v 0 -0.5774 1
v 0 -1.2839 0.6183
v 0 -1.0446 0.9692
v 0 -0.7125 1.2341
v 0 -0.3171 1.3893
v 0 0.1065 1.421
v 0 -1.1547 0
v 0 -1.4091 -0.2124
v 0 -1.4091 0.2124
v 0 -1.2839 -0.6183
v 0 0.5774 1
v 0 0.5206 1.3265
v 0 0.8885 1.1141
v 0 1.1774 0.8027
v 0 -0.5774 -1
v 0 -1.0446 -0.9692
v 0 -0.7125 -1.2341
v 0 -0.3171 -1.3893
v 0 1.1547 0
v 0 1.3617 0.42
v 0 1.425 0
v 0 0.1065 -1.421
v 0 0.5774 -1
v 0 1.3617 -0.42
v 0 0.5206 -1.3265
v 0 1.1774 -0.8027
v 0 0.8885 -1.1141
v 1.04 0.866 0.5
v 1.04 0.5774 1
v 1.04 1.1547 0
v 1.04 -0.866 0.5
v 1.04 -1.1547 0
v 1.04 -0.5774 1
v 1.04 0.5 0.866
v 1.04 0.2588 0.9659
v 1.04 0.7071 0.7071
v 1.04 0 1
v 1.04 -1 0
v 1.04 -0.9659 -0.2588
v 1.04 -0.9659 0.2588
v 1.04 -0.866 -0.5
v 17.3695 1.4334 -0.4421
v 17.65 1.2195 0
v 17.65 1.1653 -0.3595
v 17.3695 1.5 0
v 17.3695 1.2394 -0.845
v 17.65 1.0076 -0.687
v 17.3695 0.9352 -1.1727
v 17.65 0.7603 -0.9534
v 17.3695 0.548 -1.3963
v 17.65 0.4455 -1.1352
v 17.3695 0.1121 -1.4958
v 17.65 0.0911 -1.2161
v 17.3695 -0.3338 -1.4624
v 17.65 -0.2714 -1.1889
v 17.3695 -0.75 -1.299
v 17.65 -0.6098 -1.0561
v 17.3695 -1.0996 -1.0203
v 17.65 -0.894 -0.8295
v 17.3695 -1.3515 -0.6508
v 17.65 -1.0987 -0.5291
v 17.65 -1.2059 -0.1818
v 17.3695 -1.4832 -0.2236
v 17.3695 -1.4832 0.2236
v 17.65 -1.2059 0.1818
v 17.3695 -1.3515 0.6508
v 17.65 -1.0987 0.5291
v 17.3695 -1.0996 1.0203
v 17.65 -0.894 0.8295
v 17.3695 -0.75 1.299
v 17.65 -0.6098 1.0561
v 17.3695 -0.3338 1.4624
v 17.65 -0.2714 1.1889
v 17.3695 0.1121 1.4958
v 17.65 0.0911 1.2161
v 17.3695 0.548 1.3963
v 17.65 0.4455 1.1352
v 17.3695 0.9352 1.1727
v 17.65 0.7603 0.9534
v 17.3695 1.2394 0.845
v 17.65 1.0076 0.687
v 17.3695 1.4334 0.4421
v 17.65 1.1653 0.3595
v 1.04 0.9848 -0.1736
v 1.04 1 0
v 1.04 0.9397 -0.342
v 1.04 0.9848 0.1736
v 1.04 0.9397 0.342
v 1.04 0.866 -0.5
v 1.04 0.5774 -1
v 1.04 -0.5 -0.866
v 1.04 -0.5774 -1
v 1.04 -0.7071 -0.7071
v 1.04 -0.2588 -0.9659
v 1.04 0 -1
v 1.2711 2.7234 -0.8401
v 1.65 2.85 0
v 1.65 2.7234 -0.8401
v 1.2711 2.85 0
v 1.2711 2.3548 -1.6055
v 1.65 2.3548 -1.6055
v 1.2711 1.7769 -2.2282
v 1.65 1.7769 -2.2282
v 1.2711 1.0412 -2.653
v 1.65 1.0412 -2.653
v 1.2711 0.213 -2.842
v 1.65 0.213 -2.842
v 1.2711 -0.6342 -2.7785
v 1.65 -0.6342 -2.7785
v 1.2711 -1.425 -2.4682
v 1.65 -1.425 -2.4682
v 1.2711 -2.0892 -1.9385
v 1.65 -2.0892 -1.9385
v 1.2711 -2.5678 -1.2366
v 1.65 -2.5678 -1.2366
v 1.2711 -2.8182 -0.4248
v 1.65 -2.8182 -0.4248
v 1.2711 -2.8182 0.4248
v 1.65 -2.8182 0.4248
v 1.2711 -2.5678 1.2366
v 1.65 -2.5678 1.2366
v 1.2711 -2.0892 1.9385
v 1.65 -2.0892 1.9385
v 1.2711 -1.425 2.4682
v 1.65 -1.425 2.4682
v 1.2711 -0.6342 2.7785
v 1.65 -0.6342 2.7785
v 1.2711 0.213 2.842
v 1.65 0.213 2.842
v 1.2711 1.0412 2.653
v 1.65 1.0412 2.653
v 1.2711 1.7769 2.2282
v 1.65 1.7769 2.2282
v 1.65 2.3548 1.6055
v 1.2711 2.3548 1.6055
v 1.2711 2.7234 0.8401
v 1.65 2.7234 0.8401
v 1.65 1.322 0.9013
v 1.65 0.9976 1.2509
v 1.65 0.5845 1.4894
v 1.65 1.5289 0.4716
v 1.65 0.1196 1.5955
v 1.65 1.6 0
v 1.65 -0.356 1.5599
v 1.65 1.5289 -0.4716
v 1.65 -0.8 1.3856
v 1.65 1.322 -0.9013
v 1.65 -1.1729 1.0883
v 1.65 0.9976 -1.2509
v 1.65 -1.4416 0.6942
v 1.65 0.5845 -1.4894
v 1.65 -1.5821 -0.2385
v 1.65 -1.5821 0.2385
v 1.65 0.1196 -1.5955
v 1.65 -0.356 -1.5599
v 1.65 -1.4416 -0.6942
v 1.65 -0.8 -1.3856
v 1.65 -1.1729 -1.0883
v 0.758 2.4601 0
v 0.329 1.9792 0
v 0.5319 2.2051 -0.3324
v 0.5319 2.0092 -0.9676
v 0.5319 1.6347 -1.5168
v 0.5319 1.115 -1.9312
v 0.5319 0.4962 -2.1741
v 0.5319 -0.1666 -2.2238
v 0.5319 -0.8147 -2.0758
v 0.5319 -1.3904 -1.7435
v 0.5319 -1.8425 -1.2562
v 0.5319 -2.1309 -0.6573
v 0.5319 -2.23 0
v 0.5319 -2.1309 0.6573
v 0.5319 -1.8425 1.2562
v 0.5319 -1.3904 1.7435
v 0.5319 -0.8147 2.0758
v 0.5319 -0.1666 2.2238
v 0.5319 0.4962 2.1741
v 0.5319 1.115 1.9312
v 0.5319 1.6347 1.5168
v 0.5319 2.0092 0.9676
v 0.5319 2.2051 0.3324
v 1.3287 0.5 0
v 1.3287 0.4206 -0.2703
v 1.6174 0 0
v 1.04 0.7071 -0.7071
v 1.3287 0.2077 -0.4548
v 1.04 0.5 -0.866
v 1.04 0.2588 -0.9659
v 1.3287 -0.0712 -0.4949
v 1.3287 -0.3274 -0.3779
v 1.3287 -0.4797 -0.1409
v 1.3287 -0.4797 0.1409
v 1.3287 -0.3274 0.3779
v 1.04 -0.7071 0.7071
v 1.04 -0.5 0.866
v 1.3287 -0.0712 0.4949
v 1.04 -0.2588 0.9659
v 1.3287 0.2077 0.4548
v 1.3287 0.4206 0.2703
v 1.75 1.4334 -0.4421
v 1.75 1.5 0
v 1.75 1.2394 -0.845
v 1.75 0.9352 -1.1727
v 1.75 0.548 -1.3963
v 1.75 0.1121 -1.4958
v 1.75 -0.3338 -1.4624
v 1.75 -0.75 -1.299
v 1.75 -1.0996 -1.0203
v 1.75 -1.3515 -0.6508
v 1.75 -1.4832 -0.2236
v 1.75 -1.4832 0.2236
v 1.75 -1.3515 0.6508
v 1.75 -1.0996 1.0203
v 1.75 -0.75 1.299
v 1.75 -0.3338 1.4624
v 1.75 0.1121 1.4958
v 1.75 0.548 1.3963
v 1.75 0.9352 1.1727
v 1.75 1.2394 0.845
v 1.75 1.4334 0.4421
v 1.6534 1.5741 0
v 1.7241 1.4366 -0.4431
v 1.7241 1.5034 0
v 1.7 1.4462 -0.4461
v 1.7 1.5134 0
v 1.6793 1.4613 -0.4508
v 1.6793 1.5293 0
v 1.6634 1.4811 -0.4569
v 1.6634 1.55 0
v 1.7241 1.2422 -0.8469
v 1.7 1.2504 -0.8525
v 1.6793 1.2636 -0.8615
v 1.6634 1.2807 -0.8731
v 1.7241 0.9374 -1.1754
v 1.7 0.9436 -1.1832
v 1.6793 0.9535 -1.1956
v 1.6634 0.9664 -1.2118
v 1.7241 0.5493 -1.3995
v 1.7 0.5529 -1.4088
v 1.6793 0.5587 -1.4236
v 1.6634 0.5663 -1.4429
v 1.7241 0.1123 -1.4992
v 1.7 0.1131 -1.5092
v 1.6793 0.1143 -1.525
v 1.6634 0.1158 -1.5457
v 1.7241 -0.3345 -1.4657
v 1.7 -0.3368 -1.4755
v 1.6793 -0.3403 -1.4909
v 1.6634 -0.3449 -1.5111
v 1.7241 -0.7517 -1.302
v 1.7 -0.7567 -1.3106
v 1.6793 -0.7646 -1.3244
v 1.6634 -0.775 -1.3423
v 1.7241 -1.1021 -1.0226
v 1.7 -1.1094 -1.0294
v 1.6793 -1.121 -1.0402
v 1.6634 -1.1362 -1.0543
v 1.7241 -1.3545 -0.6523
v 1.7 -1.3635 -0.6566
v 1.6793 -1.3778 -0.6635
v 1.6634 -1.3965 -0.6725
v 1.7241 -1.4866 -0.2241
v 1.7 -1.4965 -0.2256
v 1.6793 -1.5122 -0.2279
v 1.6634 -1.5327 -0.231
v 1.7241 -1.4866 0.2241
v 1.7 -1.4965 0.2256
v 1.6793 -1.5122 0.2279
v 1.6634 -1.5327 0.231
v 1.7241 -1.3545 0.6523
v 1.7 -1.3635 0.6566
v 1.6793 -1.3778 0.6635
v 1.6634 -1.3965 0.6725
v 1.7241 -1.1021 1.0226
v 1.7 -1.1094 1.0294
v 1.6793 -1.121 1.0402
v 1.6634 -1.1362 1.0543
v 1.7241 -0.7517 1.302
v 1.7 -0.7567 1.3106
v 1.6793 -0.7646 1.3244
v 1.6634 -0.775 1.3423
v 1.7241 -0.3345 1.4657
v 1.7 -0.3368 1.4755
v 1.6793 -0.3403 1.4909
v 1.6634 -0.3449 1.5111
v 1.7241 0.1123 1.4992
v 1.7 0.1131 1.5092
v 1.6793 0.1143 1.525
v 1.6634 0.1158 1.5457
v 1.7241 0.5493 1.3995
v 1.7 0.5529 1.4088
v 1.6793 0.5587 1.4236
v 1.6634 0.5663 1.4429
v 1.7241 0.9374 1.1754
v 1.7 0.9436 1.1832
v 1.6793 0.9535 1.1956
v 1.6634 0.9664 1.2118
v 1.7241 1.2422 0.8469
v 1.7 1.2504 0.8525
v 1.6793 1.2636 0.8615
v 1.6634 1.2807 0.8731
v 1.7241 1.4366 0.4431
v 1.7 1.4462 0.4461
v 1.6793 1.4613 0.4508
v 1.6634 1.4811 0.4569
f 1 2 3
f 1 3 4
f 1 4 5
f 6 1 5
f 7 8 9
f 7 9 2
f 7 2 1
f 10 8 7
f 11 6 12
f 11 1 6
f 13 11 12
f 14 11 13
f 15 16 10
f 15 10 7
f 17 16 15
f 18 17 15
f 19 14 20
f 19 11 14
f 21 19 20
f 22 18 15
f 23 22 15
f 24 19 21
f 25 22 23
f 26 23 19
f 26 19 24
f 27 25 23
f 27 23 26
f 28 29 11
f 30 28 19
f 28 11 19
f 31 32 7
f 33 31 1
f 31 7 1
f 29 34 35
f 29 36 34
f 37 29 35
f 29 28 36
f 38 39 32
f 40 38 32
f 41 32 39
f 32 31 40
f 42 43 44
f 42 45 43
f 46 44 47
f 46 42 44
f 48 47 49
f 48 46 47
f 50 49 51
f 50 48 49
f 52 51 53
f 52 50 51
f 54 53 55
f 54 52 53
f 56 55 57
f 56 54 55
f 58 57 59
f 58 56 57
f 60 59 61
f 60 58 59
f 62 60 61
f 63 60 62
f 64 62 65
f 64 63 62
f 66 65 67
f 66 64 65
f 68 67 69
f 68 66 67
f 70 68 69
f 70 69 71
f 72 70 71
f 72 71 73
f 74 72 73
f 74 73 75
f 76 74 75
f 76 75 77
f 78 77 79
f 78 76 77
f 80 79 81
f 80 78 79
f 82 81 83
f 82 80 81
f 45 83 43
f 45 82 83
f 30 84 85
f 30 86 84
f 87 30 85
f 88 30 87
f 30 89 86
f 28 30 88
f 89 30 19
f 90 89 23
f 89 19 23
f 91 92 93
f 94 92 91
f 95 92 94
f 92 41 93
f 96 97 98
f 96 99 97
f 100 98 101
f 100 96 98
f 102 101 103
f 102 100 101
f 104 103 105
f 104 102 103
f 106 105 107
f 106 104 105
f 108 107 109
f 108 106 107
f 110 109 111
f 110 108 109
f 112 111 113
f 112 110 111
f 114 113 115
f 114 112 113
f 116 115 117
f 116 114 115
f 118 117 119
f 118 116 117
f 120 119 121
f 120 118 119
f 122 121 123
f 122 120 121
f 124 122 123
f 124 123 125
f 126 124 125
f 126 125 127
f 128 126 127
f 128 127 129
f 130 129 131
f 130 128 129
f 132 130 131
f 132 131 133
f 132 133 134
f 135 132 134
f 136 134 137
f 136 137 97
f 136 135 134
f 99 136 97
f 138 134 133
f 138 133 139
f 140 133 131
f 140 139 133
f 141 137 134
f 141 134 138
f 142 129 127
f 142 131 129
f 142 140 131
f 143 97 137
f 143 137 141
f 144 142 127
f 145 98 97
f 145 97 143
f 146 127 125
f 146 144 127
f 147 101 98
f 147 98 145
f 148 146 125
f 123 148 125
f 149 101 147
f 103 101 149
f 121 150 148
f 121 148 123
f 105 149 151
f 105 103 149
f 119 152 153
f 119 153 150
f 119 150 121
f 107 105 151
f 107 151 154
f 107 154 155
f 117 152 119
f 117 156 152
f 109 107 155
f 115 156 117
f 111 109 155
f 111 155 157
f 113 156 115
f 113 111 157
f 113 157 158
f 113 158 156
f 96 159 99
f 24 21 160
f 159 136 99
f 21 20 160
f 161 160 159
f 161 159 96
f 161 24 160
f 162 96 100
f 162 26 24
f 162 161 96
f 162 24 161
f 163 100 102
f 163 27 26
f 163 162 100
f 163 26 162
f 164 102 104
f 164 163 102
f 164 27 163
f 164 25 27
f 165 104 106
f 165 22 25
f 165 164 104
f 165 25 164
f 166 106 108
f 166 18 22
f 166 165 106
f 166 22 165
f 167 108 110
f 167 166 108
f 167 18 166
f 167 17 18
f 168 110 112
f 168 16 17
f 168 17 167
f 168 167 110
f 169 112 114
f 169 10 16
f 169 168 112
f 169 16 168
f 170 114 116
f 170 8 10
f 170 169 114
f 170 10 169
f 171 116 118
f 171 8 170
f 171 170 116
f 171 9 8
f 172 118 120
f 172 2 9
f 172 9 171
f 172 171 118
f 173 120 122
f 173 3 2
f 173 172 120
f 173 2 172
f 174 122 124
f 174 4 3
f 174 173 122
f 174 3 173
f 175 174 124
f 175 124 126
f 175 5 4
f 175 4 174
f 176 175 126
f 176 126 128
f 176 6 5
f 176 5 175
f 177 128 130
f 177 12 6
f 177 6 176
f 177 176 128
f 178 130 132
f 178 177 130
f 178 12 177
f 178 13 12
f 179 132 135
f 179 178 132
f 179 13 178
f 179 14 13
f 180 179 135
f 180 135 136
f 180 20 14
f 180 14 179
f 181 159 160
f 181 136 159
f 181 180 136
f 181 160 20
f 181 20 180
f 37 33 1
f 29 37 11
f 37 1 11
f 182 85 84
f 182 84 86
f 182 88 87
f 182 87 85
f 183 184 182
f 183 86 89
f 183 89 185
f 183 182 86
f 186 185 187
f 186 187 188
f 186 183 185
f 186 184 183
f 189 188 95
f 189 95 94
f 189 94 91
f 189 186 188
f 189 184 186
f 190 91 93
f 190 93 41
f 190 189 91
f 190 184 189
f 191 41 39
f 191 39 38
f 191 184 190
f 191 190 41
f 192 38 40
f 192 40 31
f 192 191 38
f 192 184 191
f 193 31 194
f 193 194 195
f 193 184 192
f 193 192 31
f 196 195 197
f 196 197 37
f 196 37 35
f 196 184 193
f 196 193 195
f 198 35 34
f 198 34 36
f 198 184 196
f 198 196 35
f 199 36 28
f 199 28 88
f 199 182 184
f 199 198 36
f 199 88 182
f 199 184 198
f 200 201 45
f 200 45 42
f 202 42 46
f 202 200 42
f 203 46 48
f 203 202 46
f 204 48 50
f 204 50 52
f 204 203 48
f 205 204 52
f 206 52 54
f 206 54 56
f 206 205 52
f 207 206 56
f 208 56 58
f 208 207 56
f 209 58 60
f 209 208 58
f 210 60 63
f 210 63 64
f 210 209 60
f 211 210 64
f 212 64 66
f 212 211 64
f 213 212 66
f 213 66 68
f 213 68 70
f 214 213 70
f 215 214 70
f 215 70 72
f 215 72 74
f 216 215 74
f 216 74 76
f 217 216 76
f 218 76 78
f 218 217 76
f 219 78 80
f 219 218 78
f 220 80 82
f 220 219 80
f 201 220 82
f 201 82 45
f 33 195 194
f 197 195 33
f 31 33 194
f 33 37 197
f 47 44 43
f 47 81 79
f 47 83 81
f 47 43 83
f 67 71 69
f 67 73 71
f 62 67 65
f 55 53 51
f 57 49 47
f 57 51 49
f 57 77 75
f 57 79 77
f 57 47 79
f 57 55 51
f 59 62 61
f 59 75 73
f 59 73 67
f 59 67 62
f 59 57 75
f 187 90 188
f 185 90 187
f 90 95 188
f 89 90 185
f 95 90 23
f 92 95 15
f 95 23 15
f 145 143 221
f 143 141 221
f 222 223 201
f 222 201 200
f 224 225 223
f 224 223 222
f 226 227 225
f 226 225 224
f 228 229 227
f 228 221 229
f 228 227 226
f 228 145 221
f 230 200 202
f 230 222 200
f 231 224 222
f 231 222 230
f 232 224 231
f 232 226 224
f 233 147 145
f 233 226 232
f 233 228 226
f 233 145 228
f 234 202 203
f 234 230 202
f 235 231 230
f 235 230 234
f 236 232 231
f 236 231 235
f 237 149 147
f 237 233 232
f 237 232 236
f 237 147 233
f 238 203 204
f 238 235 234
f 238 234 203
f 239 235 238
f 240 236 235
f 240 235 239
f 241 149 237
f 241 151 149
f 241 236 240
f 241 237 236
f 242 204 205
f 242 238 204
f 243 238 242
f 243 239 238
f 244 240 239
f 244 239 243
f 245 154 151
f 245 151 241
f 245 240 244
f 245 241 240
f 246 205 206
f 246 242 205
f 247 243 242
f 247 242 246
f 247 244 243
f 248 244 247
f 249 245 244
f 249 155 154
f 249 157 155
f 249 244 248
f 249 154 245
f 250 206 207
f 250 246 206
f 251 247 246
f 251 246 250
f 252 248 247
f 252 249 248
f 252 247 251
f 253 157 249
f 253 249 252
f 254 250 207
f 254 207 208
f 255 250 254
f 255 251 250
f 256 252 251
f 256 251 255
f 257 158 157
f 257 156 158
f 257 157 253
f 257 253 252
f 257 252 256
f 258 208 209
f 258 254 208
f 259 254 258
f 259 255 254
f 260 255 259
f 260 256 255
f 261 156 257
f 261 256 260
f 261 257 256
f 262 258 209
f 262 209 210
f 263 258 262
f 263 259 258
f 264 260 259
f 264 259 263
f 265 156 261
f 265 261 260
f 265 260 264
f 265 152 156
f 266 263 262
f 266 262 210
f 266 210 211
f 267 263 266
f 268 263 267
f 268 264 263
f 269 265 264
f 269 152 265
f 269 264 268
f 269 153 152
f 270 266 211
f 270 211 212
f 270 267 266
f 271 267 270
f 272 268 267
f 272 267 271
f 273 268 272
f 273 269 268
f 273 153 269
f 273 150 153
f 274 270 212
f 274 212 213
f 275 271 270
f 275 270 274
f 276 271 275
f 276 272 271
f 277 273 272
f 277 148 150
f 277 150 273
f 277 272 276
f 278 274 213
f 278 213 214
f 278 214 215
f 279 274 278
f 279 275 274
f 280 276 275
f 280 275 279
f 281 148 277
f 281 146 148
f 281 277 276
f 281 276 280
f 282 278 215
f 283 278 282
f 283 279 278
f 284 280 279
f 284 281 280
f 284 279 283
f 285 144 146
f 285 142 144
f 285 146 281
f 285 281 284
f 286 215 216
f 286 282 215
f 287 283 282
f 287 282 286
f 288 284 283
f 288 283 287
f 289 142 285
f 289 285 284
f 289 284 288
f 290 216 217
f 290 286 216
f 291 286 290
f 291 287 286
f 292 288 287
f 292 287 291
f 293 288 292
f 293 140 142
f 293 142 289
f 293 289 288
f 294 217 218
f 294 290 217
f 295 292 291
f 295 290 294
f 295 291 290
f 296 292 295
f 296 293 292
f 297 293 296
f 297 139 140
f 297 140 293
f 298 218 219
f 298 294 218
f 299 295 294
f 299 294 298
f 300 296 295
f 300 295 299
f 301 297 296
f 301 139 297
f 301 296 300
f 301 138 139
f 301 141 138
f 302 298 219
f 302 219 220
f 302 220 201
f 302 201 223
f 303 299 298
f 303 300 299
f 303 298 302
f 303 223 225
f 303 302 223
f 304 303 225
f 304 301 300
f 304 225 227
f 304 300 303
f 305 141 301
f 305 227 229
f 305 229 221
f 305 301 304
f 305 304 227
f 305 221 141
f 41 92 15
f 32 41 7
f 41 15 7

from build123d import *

# Parameters (mm, degrees)
FILLET_1_R  = 0.1
HEX_2_DEPTH = 1.04


with BuildPart() as part:
    # Эскиз1 → Body (revolve)
    with BuildSketch(Plane.XY):
        with BuildLine():
            Line((0, 1.425), (0, 0))
            Line((0, 0), (17.65, 0))
            Line((17.65, 0), (17.65, 1.2195))
            Line((17.65, 1.2195), (17.3695, 1.5))
            Line((17.3695, 1.5), (1.65, 1.5))
            Line((1.65, 1.5), (1.65, 2.85))
            Line((1.65, 2.85), (1.271128829, 2.85))
            ThreePointArc((1.271128829, 2.85), (0.531880191, 2.229988425), (0, 1.425))
        make_face()
    revolve(axis=Axis((-3.643489966, 0, 0), (-1, 0, 0)))

    # Скругление1
    fillet_1_edges = [part.edges().sort_by_distance(p)[0] for p in [
        (1.65, -1.5, 0),
    ]]
    fillet(fillet_1_edges, radius=FILLET_1_R)

    # Эскиз2 → Вырез-Повернуть1 (revolve, cut)
    with BuildSketch(Plane.XY):
        Polygon((0, 0), (0, 1), (1.04, 1), (1.617350269, 0), align=None)
    revolve(axis=Axis((1.617350269, 0, 0), (-1, 0, 0)), mode=Mode.SUBTRACT)

    # Эскиз3 → Hex 2 (cut)
    with BuildSketch(Plane.ZY):
        Polygon((-1, -0.577350269), (0, -1.154700538), (1, -0.577350269), (1, 0.577350269), (0, 1.154700538), (-1, 0.577350269), align=None)
    extrude(amount=-HEX_2_DEPTH, mode=Mode.SUBTRACT)


solid = part.part
